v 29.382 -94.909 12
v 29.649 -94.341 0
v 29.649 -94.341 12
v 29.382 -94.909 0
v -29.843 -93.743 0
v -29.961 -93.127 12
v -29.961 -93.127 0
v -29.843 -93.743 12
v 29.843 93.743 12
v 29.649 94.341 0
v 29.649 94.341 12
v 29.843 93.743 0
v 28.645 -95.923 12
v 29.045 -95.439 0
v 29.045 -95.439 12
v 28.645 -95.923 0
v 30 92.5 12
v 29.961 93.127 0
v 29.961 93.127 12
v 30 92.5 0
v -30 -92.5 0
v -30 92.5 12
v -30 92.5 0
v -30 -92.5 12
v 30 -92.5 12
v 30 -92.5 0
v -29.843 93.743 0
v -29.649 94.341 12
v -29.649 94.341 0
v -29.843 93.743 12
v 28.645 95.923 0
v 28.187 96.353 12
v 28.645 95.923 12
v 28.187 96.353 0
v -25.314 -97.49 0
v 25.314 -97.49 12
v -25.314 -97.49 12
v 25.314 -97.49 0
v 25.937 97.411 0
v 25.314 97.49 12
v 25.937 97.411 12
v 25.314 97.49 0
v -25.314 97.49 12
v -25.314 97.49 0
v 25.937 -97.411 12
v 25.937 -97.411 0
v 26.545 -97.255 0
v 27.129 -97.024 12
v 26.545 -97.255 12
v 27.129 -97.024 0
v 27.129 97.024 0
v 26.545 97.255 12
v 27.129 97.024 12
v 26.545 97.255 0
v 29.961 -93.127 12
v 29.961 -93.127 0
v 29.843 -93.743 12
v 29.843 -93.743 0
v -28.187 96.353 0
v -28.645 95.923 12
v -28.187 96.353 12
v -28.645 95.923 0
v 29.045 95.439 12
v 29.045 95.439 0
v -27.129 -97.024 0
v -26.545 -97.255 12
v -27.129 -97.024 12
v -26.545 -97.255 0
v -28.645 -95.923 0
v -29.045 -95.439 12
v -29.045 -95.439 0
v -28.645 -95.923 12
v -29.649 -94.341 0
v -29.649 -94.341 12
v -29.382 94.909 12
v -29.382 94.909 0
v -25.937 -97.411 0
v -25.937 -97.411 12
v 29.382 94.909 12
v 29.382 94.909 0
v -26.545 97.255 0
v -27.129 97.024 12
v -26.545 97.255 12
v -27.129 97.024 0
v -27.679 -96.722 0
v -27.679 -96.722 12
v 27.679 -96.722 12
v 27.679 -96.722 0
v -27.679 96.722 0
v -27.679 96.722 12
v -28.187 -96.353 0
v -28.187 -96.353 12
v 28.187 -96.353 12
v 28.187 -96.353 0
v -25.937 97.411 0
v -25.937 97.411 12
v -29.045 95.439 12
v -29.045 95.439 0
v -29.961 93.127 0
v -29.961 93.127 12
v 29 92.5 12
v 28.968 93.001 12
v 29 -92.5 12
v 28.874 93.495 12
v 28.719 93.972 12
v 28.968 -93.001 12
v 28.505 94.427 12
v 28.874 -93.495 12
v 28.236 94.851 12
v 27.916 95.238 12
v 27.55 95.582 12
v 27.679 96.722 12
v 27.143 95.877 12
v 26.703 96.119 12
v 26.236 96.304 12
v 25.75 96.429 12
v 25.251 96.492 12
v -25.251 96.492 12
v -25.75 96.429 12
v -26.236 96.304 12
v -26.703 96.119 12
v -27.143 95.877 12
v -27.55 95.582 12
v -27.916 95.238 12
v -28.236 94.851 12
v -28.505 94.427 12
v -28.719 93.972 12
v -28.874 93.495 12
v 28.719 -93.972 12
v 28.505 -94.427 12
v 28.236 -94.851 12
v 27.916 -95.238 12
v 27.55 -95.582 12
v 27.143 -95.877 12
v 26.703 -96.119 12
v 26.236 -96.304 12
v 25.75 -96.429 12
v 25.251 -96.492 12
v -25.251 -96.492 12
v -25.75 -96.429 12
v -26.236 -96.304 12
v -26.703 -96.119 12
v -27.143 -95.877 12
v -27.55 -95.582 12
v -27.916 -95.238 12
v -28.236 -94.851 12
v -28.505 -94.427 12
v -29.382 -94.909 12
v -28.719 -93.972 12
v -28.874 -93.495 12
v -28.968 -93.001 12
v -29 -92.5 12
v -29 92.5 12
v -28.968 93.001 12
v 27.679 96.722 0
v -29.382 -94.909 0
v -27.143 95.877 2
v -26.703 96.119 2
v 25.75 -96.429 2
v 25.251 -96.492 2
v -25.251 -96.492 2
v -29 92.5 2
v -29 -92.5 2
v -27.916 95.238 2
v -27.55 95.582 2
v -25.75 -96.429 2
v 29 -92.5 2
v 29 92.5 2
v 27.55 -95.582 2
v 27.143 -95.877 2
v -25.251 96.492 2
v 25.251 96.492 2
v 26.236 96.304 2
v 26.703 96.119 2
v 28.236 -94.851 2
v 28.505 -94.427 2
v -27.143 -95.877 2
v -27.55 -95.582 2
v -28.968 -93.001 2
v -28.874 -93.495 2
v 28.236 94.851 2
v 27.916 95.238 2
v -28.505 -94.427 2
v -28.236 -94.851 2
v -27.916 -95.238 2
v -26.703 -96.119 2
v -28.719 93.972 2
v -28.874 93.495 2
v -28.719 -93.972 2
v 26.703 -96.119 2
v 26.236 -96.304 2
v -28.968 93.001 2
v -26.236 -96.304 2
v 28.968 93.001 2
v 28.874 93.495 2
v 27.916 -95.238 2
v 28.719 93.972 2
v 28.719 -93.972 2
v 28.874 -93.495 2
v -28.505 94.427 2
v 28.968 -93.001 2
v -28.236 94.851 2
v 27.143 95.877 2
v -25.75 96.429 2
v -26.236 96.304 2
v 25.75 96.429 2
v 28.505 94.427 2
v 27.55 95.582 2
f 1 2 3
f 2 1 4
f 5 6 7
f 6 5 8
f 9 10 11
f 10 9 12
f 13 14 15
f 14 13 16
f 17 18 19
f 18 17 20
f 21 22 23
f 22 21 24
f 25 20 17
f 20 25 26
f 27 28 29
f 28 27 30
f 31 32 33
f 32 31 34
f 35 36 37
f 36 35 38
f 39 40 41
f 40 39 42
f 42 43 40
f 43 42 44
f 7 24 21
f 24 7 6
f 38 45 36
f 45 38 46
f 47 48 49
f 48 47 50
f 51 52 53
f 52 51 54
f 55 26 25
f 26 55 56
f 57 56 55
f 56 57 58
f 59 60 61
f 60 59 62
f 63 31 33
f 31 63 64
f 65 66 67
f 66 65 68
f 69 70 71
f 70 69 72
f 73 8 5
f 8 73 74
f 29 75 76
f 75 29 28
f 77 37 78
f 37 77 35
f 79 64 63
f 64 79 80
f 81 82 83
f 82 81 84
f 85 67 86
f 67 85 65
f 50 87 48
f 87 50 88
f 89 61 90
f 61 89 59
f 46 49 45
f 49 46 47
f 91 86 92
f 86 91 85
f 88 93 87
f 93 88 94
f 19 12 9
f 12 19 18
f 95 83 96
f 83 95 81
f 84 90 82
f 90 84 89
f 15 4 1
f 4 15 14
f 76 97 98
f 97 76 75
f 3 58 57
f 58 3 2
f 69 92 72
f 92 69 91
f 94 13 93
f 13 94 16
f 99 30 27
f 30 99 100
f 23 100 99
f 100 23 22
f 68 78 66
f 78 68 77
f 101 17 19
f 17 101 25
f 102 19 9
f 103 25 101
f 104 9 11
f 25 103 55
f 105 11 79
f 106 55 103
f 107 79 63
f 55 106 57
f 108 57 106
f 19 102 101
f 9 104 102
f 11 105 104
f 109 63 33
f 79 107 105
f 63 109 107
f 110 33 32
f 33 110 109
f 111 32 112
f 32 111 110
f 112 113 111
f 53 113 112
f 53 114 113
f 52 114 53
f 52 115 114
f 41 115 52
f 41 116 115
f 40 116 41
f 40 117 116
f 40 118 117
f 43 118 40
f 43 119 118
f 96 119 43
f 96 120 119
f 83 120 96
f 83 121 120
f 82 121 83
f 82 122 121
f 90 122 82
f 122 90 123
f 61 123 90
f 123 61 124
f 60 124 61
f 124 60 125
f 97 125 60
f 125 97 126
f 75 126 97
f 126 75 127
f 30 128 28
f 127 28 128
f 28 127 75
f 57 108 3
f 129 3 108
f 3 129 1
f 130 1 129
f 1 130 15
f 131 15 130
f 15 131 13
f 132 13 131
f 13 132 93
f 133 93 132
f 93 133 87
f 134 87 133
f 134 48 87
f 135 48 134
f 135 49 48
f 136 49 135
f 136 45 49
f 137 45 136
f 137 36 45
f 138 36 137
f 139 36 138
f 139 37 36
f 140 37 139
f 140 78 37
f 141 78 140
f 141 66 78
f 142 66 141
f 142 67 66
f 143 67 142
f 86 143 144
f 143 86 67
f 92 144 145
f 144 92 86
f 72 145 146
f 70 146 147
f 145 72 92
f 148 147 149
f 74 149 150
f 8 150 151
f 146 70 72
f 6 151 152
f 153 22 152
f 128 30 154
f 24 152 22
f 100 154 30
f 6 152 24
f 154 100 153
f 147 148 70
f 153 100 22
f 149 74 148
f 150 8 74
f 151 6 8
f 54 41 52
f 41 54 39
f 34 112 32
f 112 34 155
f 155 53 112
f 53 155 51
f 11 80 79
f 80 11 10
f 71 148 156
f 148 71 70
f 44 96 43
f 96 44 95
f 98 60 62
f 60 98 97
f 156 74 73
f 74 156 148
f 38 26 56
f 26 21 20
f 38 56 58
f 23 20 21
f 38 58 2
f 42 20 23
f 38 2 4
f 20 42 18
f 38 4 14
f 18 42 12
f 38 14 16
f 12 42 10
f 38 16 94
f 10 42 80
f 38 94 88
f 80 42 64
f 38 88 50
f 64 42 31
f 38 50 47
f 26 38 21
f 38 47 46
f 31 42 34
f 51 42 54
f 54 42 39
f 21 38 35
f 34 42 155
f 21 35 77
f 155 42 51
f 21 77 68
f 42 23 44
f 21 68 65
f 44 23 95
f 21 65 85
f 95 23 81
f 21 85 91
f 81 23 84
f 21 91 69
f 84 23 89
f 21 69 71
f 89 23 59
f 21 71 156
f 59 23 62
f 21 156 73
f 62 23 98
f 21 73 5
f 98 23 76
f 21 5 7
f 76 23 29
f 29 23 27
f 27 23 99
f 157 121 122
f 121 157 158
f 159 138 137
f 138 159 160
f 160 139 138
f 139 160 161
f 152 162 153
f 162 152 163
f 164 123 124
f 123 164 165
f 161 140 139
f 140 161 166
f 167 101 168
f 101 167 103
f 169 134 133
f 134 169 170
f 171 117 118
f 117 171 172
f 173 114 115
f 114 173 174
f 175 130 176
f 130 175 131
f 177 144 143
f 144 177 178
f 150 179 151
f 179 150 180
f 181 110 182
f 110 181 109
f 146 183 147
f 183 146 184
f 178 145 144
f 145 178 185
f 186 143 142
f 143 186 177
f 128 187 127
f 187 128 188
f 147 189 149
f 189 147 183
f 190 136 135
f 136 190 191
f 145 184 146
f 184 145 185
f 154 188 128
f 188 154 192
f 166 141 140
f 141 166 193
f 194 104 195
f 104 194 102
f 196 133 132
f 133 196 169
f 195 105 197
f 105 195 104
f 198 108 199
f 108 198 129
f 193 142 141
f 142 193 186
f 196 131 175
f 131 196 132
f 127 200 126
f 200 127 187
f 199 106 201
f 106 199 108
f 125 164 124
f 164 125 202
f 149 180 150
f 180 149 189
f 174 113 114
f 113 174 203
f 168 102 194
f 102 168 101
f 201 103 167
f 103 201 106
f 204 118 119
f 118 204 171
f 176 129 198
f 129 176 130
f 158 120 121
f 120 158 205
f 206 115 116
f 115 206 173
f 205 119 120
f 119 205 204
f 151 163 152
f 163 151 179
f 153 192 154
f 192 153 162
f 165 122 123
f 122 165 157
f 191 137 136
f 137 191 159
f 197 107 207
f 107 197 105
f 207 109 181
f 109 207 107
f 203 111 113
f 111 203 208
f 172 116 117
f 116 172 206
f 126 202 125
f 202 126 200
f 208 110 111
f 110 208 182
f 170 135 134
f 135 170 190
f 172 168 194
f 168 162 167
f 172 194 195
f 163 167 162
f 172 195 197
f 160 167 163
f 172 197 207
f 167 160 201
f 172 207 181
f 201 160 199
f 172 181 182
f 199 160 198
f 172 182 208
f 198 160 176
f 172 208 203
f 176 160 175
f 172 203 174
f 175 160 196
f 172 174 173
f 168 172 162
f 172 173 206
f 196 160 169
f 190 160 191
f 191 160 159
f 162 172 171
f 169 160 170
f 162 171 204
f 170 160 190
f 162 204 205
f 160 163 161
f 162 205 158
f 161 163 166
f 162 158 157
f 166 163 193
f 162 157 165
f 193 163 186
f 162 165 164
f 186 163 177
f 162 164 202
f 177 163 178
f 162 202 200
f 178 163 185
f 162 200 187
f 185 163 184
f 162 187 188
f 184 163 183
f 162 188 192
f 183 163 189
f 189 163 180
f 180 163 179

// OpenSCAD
$fn = 50;


difference() {
	union() {
		hull() {
			translate(v = [-25.0000000000, 92.5000000000, 0]) {
				cylinder(h = 12, r = 5);
			}
			translate(v = [25.0000000000, 92.5000000000, 0]) {
				cylinder(h = 12, r = 5);
			}
			translate(v = [-25.0000000000, -92.5000000000, 0]) {
				cylinder(h = 12, r = 5);
			}
			translate(v = [25.0000000000, -92.5000000000, 0]) {
				cylinder(h = 12, r = 5);
			}
		}
	}
	union() {
		translate(v = [0, 0, 2]) {
			hull() {
				translate(v = [-25.0000000000, 92.5000000000, 0]) {
					cylinder(h = 10, r = 4);
				}
				translate(v = [25.0000000000, 92.5000000000, 0]) {
					cylinder(h = 10, r = 4);
				}
				translate(v = [-25.0000000000, -92.5000000000, 0]) {
					cylinder(h = 10, r = 4);
				}
				translate(v = [25.0000000000, -92.5000000000, 0]) {
					cylinder(h = 10, r = 4);
				}
			}
		}
	}
}
